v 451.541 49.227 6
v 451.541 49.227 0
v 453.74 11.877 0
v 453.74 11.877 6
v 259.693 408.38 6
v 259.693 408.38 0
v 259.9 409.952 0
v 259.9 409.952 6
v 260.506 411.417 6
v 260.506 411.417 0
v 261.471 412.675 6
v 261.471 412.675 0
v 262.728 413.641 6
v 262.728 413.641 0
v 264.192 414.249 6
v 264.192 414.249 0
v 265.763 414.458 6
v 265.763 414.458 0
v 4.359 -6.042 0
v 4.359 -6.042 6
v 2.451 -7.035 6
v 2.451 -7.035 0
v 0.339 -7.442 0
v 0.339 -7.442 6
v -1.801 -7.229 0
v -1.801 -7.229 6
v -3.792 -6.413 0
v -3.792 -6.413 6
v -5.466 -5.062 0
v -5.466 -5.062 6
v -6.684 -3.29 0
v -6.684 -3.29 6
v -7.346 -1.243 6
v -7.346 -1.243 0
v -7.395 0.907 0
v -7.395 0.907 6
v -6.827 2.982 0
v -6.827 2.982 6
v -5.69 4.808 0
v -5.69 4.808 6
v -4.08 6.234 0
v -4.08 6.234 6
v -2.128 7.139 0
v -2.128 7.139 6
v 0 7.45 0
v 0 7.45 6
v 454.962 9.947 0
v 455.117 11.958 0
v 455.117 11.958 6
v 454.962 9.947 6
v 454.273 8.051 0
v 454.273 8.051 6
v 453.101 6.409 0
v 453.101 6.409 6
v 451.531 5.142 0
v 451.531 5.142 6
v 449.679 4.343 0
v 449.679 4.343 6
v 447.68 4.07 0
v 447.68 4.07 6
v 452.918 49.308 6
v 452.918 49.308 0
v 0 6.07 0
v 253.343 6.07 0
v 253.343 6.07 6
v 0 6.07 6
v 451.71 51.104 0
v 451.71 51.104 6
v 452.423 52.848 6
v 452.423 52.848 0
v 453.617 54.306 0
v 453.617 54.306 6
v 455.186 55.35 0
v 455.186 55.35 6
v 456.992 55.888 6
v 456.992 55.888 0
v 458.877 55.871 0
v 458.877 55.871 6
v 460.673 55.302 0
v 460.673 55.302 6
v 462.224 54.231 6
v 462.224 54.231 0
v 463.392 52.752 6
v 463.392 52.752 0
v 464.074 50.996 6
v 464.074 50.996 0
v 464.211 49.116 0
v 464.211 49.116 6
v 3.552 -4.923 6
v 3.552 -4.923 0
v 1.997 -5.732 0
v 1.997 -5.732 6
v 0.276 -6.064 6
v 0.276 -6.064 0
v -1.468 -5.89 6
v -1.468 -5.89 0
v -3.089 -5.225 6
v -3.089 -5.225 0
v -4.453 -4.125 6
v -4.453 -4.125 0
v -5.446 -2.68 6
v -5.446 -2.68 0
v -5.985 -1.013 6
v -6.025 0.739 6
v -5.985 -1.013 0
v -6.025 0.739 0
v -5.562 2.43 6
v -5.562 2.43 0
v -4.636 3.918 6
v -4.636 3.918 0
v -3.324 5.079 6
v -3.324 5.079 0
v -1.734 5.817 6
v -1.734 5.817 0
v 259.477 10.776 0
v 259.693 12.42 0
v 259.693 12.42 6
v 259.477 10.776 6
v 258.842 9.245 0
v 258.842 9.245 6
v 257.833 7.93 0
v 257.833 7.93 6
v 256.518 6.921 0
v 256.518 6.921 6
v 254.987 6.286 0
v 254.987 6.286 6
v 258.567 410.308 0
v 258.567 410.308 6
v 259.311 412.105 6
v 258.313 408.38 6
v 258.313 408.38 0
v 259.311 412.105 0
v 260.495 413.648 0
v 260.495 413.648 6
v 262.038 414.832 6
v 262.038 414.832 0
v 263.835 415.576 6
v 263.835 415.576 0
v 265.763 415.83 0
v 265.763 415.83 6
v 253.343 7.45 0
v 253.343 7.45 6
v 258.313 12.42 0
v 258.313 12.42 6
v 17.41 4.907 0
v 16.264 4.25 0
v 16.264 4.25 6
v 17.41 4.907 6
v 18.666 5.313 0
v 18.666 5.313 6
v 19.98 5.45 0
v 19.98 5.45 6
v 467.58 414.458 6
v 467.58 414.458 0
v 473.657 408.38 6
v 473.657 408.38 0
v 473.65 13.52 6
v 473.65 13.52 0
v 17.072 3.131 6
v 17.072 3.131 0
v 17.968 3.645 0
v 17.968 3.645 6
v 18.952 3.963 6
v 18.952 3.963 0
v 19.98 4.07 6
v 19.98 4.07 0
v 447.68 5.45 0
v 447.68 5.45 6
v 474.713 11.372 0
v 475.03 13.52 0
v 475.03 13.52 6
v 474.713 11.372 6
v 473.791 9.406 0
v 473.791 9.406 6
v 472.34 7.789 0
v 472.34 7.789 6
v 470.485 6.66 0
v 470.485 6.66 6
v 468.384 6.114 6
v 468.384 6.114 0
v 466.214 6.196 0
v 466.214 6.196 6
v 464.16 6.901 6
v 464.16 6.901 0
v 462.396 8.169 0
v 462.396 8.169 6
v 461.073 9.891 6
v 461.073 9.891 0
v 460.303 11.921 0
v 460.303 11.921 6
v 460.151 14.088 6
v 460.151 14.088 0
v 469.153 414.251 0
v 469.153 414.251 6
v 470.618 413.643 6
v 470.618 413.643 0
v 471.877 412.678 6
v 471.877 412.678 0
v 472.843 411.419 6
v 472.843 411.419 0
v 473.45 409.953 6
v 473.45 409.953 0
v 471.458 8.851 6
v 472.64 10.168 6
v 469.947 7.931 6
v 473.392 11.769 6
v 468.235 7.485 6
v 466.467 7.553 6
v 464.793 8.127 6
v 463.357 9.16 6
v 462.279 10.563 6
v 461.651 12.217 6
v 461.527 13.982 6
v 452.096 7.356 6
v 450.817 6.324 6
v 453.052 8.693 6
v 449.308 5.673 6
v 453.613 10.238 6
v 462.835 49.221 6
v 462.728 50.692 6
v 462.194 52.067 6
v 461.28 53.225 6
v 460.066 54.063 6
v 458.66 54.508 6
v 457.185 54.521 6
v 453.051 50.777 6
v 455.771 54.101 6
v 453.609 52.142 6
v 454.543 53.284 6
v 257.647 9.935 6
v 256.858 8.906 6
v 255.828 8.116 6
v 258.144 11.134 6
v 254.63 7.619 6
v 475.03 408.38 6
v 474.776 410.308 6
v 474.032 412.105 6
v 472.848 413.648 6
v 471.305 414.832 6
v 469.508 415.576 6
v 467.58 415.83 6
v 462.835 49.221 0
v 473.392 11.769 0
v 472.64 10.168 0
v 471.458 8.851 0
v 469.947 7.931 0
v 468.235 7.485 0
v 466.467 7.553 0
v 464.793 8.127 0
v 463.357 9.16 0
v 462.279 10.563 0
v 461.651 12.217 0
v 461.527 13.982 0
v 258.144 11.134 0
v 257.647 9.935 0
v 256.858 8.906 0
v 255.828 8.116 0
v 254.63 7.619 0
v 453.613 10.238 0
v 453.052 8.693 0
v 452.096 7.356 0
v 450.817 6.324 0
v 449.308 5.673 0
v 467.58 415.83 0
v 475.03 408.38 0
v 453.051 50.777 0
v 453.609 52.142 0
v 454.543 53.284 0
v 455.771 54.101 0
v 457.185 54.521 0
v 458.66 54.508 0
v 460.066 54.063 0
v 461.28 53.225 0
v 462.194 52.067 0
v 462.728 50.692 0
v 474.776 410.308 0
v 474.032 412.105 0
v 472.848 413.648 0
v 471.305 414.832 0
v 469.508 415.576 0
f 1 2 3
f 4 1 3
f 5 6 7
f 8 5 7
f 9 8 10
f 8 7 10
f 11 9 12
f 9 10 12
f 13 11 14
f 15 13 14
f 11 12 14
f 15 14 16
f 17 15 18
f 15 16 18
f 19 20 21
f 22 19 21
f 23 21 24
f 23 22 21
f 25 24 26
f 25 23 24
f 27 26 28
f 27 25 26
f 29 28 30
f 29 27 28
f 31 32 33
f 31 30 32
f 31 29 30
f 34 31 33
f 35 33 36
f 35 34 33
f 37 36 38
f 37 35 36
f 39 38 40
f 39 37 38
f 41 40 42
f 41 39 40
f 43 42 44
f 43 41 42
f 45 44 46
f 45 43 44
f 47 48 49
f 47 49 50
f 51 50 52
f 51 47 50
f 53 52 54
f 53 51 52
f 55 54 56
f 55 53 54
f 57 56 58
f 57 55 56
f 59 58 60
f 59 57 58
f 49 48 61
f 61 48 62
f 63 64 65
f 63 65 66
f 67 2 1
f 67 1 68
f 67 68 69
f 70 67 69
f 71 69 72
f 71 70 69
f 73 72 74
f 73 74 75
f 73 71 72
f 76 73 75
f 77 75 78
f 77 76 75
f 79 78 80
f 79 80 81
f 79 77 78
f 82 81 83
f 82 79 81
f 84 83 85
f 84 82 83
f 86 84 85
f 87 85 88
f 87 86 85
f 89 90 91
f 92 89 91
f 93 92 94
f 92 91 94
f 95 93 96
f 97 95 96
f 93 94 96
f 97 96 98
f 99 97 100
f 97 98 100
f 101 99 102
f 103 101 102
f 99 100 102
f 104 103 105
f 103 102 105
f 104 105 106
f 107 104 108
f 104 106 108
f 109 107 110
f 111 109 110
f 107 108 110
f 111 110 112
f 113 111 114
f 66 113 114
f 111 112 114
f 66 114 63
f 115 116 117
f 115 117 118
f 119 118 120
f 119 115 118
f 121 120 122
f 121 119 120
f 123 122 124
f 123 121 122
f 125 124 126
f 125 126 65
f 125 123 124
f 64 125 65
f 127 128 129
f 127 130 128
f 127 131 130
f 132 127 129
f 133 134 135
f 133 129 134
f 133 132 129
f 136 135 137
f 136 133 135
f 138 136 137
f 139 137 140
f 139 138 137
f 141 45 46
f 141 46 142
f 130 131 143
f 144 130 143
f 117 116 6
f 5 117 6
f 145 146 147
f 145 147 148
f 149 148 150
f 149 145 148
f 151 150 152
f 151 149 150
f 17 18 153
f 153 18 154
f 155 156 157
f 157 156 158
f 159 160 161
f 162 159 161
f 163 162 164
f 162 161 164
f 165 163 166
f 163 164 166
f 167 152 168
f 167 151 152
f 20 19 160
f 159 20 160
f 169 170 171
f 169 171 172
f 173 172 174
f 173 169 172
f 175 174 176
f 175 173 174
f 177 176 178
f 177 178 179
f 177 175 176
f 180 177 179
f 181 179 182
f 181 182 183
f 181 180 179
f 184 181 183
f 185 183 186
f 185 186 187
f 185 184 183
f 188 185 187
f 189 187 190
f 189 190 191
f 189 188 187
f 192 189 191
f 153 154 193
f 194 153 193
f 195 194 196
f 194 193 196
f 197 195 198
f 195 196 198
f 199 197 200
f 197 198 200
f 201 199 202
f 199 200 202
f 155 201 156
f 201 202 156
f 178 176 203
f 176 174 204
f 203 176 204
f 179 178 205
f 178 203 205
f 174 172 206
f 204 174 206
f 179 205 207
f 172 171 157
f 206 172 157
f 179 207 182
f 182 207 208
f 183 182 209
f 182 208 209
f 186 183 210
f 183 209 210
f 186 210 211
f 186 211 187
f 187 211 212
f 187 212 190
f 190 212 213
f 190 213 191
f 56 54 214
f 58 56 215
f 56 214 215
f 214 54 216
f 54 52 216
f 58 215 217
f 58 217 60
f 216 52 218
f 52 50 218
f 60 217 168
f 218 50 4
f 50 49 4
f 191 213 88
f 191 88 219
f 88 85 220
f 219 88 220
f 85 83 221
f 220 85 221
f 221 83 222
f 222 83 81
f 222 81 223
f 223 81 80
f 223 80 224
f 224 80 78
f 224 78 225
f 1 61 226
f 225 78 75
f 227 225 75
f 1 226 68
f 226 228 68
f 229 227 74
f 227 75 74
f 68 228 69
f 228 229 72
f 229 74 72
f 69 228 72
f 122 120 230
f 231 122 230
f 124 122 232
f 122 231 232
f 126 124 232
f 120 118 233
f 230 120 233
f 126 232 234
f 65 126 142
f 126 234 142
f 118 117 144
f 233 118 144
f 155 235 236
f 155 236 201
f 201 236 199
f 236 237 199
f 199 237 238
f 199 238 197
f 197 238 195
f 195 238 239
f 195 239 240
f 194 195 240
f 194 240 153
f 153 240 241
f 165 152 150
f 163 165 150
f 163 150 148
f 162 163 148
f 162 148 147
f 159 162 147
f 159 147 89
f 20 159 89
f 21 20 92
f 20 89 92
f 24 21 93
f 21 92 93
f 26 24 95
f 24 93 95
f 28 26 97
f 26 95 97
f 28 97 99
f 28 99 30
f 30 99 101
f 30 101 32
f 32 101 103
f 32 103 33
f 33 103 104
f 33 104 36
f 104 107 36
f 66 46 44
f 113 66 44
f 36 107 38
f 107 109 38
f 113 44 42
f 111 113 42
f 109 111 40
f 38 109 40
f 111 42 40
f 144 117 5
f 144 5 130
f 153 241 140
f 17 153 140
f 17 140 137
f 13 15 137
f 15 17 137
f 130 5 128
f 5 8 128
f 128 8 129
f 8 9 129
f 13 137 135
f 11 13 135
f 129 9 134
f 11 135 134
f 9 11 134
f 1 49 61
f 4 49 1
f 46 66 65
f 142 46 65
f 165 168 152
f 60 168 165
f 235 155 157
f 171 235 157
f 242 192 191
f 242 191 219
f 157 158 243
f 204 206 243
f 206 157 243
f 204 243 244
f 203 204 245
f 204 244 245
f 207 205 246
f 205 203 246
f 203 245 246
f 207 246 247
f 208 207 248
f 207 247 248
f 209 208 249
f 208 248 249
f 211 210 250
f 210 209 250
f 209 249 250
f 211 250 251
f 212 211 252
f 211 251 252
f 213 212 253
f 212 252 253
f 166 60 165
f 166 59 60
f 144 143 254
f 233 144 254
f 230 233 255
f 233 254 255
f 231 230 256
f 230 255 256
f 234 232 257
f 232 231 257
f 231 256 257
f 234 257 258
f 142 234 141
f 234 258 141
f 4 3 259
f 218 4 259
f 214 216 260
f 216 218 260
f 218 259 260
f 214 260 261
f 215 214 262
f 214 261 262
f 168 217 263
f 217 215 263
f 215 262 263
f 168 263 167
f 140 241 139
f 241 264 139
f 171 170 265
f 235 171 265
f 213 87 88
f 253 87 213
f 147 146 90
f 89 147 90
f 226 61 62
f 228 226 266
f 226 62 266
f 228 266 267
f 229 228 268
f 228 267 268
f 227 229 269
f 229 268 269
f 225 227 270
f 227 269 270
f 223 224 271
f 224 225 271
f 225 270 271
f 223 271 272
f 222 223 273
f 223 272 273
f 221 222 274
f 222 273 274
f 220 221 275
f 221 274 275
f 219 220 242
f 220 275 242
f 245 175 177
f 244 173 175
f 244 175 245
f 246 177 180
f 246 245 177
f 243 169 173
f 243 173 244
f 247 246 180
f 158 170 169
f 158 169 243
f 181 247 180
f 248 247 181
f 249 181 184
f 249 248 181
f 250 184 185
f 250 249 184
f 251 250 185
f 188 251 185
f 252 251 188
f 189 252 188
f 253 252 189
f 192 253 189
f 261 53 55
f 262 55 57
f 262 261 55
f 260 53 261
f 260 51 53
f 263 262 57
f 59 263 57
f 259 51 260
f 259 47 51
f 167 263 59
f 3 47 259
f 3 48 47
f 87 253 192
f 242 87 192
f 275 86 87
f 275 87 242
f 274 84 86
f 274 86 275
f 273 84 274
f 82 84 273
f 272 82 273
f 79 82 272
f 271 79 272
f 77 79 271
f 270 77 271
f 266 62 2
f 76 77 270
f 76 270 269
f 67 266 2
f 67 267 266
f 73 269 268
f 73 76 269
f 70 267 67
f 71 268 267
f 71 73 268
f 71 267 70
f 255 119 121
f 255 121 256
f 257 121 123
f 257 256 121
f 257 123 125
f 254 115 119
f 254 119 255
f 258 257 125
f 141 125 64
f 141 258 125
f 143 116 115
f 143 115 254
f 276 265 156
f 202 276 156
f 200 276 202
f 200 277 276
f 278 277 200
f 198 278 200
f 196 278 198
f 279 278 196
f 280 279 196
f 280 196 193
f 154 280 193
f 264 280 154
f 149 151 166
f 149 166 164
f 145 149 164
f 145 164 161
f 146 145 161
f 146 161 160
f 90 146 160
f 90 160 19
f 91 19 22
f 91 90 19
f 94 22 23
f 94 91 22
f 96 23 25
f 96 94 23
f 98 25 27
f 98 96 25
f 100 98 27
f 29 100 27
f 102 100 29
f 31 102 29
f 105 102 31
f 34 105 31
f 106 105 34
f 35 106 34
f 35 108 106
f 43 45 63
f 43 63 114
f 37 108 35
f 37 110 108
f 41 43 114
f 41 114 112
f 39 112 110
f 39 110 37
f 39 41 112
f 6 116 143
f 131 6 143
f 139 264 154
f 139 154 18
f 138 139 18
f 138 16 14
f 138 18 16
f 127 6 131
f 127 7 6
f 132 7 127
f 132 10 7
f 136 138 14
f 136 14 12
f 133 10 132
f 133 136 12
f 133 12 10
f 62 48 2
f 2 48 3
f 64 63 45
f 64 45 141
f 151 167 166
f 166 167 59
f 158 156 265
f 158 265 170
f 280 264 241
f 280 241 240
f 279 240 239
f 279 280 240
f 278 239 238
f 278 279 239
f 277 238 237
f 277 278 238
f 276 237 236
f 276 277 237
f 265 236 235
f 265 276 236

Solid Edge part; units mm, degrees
sketch "Sketch1" plane through (0, 0, 0) normal (0, 0, 1) x (1, 0, 0)
  line L0 (447.68, 4.07) -> (19.9797, 4.07)
  arc A0 (17.0718, 3.1305) -> (19.9797, 4.07) centre (19.9797, -0.9) cw
  line L1 (4.359, -6.0417) -> (17.0718, 3.1305)
  arc A1 (0, 7.45) -> (4.359, -6.0417) centre (0, 0) ccw
  line L2 (0, 7.45) -> (253.3432, 7.45)
  arc A2 (253.3432, 7.45) -> (258.3132, 12.42) centre (253.3432, 12.42) ccw
  line L3 (258.3132, 408.38) -> (258.3132, 12.42)
  arc A3 (265.7632, 415.83) -> (258.3132, 408.38) centre (265.7632, 408.38) ccw
  line L4 (467.5797, 415.83) -> (265.7632, 415.83)
  arc A4 (467.5797, 415.83) -> (475.0297, 408.38) centre (467.5797, 408.38) cw
  line L5 (475.0297, 13.52) -> (475.0297, 408.38)
  arc A5 (475.0297, 13.52) -> (460.1514, 14.0875) centre (467.5797, 13.52) cw
  line L6 (460.1514, 14.0875) -> (462.8353, 49.2214)
  arc A6 (462.8353, 49.2214) -> (452.9183, 49.3079) centre (457.8797, 49.6) ccw
  line L7 (455.1171, 11.9578) -> (452.9183, 49.3079)
  arc A7 (447.68, 4.07) -> (455.1171, 11.9578) centre (447.68, 11.52) ccw
  line L8 (19.9797, 5.45) -> (447.68, 5.45)
  arc A8 (447.68, 5.45) -> (453.7395, 11.8767) centre (447.68, 11.52) ccw
  line L9 (451.5407, 49.2268) -> (453.7395, 11.8767)
  arc A9 (451.5407, 49.2268) -> (464.2113, 49.1163) centre (457.8797, 49.6) cw
  line L10 (464.2113, 49.1163) -> (461.5274, 13.9823)
  arc A10 (461.5274, 13.9823) -> (473.6497, 13.5199) centre (467.5797, 13.52) ccw
  line L11 (473.6573, 408.38) -> (473.6497, 13.5199)
  arc A11 (467.5797, 414.4576) -> (473.6573, 408.38) centre (467.5797, 408.38) cw
  line L12 (265.7632, 414.4576) -> (467.5797, 414.4576)
  arc A12 (259.6932, 408.38) -> (265.7632, 414.4576) centre (265.7708, 408.38) cw
  line L13 (259.6932, 12.42) -> (259.6932, 408.38)
  arc A13 (259.6932, 12.42) -> (253.3432, 6.07) centre (253.3432, 12.42) cw
  line L14 (253.3432, 6.07) -> (0, 6.07)
  arc A14 (3.5516, -4.9225) -> (0, 6.07) centre (0, 0) cw
  line L15 (16.2644, 4.2496) -> (3.5516, -4.9225)
  arc A15 (16.2644, 4.2496) -> (19.9797, 5.45) centre (19.9797, -0.9) cw
extrude "Protrusion1" add sketch "Sketch1" along normal blind 6
properties material "Polyurethene"
